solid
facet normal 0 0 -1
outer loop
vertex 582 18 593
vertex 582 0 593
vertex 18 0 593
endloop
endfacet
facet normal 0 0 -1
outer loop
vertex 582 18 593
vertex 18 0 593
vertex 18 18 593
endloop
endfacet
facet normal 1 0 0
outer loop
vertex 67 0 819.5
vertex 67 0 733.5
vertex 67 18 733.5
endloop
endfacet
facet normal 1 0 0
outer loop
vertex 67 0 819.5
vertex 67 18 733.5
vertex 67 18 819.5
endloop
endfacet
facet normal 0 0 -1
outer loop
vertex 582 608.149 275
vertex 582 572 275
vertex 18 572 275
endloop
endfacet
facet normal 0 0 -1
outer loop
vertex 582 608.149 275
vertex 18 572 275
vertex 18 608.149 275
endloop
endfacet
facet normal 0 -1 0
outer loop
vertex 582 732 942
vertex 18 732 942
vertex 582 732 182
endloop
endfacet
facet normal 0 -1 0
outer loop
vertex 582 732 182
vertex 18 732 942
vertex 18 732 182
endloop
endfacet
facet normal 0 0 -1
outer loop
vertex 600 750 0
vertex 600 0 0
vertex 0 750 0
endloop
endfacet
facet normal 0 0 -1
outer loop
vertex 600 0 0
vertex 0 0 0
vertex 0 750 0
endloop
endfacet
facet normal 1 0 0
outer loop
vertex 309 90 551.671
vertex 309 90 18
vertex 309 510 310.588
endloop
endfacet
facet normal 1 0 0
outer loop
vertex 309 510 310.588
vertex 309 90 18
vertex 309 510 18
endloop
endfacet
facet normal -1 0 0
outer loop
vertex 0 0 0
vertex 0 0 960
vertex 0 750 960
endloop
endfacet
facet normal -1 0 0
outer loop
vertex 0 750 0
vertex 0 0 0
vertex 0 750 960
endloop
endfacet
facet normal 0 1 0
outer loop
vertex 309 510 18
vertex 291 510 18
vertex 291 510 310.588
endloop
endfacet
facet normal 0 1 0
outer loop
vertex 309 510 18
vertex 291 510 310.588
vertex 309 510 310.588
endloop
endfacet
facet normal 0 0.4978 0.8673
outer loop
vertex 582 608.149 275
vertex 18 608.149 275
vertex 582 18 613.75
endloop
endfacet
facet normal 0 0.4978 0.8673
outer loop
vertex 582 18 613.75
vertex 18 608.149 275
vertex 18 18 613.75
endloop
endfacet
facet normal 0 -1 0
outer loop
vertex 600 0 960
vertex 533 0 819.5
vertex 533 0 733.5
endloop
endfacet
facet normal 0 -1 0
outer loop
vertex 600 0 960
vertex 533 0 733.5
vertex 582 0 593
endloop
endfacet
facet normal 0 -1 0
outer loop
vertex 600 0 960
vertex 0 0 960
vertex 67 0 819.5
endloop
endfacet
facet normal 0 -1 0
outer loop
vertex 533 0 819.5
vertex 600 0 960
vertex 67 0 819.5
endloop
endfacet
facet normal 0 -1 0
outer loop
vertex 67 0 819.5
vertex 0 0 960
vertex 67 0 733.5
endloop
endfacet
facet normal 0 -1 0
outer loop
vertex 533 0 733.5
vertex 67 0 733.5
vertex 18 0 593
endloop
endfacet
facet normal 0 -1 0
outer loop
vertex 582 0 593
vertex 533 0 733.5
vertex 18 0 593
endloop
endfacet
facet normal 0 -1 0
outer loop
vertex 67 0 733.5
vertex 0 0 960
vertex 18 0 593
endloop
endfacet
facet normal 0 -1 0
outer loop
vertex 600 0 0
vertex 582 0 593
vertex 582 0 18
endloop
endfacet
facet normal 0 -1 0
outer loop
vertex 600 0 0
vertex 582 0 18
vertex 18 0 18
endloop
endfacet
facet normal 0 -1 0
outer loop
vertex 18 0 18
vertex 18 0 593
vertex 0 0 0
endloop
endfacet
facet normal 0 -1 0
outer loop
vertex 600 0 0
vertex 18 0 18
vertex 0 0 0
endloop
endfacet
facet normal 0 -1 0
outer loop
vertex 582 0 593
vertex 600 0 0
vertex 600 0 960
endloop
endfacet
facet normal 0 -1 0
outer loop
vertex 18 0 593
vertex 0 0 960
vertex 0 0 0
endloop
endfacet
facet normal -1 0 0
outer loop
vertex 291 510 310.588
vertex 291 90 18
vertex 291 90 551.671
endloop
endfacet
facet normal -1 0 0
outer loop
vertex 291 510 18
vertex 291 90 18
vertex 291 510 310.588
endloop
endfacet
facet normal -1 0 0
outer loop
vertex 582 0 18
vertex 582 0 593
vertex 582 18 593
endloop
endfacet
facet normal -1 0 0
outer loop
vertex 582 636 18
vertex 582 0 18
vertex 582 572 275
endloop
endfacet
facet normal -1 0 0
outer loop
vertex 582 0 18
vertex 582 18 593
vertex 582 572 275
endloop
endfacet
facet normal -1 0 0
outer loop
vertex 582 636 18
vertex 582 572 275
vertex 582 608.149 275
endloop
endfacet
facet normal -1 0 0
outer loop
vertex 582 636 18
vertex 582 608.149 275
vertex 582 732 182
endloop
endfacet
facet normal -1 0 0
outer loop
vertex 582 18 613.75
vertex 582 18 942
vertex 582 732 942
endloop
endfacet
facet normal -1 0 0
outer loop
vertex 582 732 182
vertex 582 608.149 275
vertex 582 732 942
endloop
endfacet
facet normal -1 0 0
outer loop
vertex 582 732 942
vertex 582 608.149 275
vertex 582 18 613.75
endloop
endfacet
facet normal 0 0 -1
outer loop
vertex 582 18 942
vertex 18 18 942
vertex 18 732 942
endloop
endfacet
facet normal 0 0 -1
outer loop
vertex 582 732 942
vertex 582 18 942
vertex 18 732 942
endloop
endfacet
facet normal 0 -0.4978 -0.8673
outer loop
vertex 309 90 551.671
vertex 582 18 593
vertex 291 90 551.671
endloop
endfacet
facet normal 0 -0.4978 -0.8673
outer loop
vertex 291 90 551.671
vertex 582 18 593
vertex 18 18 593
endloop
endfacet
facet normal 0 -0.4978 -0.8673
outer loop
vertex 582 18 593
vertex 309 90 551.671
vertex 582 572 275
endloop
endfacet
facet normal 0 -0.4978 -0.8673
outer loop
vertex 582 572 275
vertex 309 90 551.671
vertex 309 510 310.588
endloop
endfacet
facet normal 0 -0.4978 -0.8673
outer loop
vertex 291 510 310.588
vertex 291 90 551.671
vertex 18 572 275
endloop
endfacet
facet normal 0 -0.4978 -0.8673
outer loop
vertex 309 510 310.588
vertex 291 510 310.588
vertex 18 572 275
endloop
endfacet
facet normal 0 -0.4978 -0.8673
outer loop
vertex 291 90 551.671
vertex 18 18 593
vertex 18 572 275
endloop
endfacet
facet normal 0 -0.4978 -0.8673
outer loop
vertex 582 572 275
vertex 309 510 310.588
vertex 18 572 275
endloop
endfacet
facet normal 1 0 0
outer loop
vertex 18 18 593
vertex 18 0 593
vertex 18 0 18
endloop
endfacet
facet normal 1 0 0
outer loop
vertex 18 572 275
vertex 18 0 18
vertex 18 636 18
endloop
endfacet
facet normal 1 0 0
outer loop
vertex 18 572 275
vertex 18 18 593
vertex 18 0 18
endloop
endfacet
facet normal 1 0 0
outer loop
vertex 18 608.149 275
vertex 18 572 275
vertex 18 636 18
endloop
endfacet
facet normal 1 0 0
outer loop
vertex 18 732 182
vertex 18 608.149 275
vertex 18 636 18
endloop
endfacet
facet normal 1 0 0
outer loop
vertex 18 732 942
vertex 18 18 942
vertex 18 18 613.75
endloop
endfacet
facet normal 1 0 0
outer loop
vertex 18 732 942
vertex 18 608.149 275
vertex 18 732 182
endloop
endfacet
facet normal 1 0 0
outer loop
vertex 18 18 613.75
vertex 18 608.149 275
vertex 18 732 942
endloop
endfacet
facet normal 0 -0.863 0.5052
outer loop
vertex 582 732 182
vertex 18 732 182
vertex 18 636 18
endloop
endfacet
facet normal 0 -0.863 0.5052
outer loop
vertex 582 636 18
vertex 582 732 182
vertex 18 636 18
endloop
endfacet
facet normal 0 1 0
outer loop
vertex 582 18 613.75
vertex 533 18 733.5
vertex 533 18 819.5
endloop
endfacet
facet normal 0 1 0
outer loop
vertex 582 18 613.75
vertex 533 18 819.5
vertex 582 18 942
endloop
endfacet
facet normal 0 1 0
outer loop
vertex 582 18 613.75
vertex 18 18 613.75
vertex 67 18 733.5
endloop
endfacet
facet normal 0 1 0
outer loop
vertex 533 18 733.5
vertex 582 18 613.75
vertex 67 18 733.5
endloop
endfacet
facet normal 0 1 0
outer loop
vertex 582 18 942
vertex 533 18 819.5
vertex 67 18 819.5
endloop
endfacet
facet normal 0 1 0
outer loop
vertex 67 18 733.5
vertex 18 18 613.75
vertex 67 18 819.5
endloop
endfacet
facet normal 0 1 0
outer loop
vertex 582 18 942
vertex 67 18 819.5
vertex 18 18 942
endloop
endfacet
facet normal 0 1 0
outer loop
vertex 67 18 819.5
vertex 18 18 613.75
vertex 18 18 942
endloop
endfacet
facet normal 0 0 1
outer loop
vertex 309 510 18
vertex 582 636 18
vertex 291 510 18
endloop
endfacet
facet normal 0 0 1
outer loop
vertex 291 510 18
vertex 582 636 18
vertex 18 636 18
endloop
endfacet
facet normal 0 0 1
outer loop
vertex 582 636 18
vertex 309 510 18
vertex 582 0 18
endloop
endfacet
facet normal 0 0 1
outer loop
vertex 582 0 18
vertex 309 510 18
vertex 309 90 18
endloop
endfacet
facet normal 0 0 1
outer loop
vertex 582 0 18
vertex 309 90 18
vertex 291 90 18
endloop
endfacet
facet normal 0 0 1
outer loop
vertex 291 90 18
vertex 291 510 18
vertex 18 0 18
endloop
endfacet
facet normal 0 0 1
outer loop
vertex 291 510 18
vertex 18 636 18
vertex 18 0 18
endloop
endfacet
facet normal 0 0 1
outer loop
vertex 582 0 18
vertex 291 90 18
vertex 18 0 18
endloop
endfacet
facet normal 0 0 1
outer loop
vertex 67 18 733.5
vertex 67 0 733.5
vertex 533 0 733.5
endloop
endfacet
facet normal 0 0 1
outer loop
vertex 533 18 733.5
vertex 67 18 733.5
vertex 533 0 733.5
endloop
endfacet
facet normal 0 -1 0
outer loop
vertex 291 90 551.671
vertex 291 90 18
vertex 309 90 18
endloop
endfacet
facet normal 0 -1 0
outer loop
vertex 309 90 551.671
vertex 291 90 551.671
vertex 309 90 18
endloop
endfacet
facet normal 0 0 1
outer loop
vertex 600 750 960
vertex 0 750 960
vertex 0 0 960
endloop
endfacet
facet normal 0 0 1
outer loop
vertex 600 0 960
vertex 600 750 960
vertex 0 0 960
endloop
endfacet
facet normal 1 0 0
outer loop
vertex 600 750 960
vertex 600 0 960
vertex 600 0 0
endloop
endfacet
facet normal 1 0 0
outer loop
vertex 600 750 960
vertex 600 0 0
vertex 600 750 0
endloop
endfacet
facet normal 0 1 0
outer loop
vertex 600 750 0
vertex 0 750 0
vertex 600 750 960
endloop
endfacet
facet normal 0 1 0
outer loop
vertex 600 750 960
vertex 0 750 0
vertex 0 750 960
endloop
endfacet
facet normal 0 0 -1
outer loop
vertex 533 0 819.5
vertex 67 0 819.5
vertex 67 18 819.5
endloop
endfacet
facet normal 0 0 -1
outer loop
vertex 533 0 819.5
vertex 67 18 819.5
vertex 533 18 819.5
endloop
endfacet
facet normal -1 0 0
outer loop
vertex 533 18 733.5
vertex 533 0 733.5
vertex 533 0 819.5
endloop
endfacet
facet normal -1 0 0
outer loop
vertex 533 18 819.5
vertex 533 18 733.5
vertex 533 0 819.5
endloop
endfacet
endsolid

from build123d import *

# Parameters (mm, degrees)
F0_W     = 750
F0_H     = 960
F1_DEPTH = 18
F3_DEPTH = 564
F5_DEPTH = 18
F6_W     = 466
F6_H     = 86
F7_DEPTH = 25
F8_W     = 18
F8_H     = 420


with BuildPart() as f1:
    # F0 (on Right) → F1 (new body)
    with BuildSketch(Plane.YZ):
        with Locations((375, 480)):
            Rectangle(F0_W, F0_H)
    extrude(amount=F1_DEPTH)

    # F2 (on face) → F3 (join)
    with BuildSketch(Plane.YZ.offset(18)):
        Polygon((0, 18), (0, 0), (750, 0), (750, 960), (0, 960), (0, 593), (18, 593), (18, 613.75), (18, 942), (732, 942), (732, 275), (732, 182), (732, 18), (636, 18), align=None)
        Polygon((18, 613.75), (18, 593), (572, 275), (590, 275), (608.1493710692, 275), align=None)
        Polygon((732, 182), (636, 18), (732, 18), align=None)
    extrude(amount=F3_DEPTH)

    # F4 (on face) → F5 (join)
    with BuildSketch(Plane.YZ.offset(582)):
        Polygon((750, 960), (0, 960), (0, 593), (18, 593), (572, 275), (608.1493710692, 275), (18, 613.75), (18, 942), (732, 942), (732, 182), (636, 18), (0, 18), (0, 0), (750, 0), align=None)
        Polygon((18, 593), (0, 593), (0, 18), (636, 18), (732, 182), (732, 942), (18, 942), (18, 613.75), (608.1493710692, 275), (572, 275), align=None)
    extrude(amount=F5_DEPTH)

    # F6 (on face) → F7 (cut)
    with BuildSketch(Plane.XZ):
        with Locations((300, 776.5)):
            Rectangle(F6_W, F6_H)
    extrude(amount=-F7_DEPTH, mode=Mode.SUBTRACT)

    # F8 (on face) → F9 (join, up to the next surface of F1)
    with BuildSketch(Plane.XY.offset(18)):
        with Locations((300, 300)):
            Rectangle(F8_W, F8_H)
    extrude(until=Until.NEXT)


solid = f1.part
